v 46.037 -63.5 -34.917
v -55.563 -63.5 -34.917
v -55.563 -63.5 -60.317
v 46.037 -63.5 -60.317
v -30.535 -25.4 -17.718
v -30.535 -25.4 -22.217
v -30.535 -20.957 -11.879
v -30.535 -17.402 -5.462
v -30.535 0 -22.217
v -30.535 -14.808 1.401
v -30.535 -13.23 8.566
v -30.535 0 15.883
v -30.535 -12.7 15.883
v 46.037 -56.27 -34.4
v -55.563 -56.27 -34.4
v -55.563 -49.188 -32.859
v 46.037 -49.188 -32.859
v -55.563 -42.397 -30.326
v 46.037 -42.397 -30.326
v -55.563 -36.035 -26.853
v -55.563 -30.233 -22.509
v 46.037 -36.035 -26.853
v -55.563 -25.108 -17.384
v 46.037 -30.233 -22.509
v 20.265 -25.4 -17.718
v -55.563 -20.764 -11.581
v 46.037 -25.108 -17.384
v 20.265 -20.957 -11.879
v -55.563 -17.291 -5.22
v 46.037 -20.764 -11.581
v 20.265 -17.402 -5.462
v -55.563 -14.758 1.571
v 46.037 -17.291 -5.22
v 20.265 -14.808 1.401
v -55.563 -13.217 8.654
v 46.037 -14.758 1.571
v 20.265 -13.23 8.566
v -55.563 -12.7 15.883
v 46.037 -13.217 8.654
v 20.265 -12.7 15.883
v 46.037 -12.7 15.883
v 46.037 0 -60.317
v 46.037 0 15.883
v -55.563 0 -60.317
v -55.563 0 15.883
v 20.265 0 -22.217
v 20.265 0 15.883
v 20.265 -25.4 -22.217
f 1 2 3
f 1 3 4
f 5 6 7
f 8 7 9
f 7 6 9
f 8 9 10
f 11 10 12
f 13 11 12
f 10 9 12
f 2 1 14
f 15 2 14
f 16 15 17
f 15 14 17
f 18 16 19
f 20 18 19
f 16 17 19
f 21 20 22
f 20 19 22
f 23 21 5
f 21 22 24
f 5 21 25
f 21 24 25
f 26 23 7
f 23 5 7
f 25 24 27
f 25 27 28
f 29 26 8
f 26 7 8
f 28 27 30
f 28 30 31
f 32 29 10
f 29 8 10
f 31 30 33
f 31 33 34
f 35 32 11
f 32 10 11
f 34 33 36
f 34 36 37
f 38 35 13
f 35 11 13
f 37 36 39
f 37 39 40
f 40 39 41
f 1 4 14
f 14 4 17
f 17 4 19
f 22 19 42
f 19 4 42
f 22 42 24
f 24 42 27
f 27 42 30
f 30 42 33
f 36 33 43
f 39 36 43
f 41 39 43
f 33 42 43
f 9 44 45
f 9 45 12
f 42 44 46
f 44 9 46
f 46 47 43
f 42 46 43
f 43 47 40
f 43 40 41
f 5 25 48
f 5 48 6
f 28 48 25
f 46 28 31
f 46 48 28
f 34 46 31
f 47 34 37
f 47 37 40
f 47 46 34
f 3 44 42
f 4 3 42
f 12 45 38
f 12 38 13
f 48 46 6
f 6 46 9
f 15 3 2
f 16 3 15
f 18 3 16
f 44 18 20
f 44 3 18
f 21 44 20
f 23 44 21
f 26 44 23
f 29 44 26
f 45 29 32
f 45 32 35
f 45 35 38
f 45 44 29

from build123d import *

# Parameters (mm, degrees)
F0_W     = 101.6
F0_H     = 76.2
F1_DEPTH = 63.5
F3_DEPTH = 101.6
F4_W     = 50.8
F4_H     = 38.1
F5_DEPTH = 25.4


with BuildPart() as f1:
    # F0 (on Front) → F1 (new body)
    with BuildSketch(Plane.XZ):
        with Locations((-4.7626945901, -22.2168454429)):
            Rectangle(F0_W, F0_H)
    extrude(amount=F1_DEPTH)

    # F2 (on face) → F3 (cut)
    with BuildSketch(Plane.YZ.offset(46.0373054099)):
        with BuildLine():
            ThreePointArc((-63.5, -34.9168454429), (-27.5789755157, -20.0378699272), (-12.7, 15.8831545571))
            Line((-12.7, 15.8831545571), (-63.5, 15.8831545571))
            Line((-63.5, 15.8831545571), (-63.5, -34.9168454429))
        make_face()
    extrude(amount=-F3_DEPTH, mode=Mode.SUBTRACT)

    # F4 (on face) → F5 (cut)
    with BuildSketch(Plane(origin=(0, 0, 0), x_dir=(-1, 0, 0), z_dir=(0, 1, 0))):
        with Locations((5.135083878, -3.1668454429)):
            Rectangle(F4_W, F4_H)
    extrude(amount=-F5_DEPTH, mode=Mode.SUBTRACT)


solid = f1.part
